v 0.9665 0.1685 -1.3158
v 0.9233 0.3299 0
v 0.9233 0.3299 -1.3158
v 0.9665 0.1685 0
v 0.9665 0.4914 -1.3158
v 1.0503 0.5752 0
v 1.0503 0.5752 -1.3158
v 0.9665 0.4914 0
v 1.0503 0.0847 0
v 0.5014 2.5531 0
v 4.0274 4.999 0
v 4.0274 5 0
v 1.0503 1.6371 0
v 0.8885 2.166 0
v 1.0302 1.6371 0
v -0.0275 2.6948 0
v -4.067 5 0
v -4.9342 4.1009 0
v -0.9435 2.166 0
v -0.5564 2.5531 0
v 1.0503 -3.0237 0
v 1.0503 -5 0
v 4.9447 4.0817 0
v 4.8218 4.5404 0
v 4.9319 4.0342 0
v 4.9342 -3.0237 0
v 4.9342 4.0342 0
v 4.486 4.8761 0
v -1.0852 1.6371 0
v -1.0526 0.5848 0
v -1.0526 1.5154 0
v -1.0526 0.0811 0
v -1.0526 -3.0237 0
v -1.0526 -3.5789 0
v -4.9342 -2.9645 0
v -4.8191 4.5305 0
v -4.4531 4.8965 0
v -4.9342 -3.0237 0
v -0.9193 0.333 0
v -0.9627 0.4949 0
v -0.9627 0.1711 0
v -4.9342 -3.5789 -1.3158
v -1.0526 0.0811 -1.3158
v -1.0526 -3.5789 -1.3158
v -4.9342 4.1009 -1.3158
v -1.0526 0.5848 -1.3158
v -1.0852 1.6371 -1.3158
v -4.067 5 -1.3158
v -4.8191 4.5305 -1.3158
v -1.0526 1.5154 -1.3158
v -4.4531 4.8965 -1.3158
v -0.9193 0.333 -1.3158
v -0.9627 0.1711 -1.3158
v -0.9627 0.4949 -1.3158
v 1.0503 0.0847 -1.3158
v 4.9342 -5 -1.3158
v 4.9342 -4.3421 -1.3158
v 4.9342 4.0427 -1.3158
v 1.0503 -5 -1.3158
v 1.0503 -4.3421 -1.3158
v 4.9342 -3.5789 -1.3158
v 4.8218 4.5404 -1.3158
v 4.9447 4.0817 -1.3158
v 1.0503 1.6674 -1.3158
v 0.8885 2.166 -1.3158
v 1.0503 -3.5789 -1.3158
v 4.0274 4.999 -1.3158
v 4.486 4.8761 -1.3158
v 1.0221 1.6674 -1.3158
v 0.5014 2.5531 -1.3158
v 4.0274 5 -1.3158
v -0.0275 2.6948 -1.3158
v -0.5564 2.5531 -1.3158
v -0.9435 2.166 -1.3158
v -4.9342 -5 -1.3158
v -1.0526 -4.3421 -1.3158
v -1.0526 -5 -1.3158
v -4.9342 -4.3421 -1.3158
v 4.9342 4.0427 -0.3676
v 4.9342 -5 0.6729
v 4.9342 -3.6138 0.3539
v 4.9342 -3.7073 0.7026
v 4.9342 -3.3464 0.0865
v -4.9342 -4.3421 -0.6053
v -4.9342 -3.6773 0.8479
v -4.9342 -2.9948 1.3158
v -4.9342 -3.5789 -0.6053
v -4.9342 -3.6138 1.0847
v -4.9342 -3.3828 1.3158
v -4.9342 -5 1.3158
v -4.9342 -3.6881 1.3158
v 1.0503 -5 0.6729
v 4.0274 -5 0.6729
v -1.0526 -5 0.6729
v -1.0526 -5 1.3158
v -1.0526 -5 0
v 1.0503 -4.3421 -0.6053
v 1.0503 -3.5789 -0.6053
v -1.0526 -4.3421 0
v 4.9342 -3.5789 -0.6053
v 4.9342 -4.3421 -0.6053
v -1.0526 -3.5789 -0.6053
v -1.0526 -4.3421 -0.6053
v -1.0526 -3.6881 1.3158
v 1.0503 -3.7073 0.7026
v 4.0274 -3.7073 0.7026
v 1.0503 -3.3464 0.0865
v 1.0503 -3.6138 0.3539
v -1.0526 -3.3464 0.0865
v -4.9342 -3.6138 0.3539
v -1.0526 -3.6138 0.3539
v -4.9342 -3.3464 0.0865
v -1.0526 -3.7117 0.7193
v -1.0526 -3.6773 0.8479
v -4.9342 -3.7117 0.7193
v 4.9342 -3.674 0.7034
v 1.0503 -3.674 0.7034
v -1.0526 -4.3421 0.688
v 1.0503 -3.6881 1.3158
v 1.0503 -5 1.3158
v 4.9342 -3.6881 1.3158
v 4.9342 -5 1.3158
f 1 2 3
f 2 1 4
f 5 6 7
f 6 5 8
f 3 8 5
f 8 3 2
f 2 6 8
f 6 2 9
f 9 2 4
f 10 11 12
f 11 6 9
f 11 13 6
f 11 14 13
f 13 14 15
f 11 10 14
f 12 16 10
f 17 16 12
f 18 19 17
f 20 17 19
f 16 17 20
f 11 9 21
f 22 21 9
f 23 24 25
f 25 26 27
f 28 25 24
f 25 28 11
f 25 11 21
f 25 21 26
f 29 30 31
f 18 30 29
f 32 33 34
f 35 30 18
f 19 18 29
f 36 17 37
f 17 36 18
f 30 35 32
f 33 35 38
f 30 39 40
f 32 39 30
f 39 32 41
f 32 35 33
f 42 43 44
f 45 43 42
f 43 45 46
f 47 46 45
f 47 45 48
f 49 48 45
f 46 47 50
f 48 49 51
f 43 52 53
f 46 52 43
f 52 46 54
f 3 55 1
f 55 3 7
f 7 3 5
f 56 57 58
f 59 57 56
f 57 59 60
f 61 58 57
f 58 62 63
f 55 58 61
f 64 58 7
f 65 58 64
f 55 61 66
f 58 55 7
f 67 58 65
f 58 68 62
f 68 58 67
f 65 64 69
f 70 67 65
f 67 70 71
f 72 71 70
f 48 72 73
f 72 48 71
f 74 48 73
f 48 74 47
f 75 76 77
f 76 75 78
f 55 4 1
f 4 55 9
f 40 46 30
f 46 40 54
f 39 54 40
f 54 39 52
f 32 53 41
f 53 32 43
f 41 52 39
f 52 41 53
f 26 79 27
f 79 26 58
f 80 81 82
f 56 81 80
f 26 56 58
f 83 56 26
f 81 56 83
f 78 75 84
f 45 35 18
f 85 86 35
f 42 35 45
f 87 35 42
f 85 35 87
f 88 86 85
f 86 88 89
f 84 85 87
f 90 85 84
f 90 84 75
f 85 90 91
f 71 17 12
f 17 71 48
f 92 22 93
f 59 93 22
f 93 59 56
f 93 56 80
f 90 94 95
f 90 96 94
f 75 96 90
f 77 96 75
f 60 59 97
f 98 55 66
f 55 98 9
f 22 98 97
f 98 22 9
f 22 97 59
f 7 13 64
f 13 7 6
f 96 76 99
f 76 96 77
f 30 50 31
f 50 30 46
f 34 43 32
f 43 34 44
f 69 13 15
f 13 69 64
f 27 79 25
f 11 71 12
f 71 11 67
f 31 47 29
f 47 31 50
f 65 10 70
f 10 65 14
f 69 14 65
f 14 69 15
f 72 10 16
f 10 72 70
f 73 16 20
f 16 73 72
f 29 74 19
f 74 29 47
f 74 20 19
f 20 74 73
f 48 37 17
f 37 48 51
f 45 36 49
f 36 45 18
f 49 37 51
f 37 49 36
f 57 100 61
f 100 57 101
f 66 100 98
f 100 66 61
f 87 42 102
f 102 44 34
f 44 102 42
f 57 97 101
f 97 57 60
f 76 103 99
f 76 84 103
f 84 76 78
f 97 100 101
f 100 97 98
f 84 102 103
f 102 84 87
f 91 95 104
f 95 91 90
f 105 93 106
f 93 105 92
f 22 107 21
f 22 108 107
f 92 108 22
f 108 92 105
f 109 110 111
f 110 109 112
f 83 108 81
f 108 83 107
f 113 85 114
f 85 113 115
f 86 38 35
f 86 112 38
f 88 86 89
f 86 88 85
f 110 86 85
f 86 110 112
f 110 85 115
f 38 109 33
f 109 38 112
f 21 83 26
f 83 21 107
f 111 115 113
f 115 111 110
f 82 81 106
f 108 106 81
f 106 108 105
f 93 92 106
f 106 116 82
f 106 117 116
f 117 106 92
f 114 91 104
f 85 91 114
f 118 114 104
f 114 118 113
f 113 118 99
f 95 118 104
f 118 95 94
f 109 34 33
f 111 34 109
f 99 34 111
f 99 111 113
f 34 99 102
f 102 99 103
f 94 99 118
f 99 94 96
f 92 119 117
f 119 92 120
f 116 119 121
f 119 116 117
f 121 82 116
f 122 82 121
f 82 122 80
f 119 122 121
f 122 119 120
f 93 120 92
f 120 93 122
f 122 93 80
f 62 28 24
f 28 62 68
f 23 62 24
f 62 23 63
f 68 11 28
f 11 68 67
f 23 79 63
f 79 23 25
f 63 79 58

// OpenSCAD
intersection() {
translate([-5.921052, -6.000000, -1.578948])
cube(size = [11.842104, 12.000000, 3.157896], center = false);
union() {
// Begin.
union() {
difference() {
difference() {
union() {
union() {
rotate([0, -90, 0])
translate([-0.657895, 0.32995, -1.24614])
rotate([0, 90, 0])
cylinder(h = 1.31579, r1 = 0.32288, r2 = 0.32288, center = true, $fn = 12);

rotate([0, -90, 0])
translate([-9.1, 0.33299, 1.24306])
rotate([0, 90, 0])
cylinder(h = 18.2, r1 = 0.32378, r2 = 0.32378, center = true, $fn = 12);
}

difference() {
rotate([0, -0, 0])
translate([0, 0, -0.657895])
cube(size = [9.86842, 10, 1.31579], center = true);

rotate([-178.681, -0, 0])
translate([-0.00116301, 8.28164, 0])
cube(size = [2.10293, 19.8367, 36.4], center = true);
}
}

difference() {
union() {
rotate([-178.681, -0, 0])
translate([-1.45142, -0.534728, 0])
cube(size = [5.00345, 6.99678, 36.4], center = true);

rotate([-178.681, -0, 0])
translate([0.49053, -11.1166, 0])
cube(size = [8.88736, 14.1669, 36.4], center = true);
}

difference() {
rotate([0, -0, 0])
translate([0.03711, 7.31053, -0.657895])
cube(size = [7.98052, 21.7789, 1.31579], center = true);

rotate([0, -90, 0])
translate([-0.657895, 1.63709, 0.0275])
rotate([0, 90, 0])
cylinder(h = 1.31579, r1 = 1.05773, r2 = 1.05773, center = true, $fn = 12);
}
}
}

difference() {
union() {
rotate([0, -0, 0])
translate([-6.6329, -3.96053, 0])
cube(size = [23.1342, 0.76316, 2.63158], center = true);

difference() {
rotate([-178.681, -0, 0])
translate([-11.0766, -11.1166, 8.70612])
cube(size = [14.2469, 14.1669, 18.9878], center = true);

rotate([0, -90, 0])
translate([0, 4.03059, 3.95315])
rotate([0, 90, 0])
cylinder(h = 36.4, r1 = 0.99991, r2 = 0.99991, center = true, $fn = 12);
}
}

rotate([0, -0, 0])
translate([8.57369, 0, 0.355265])
cube(size = [19.2526, 36.4, 1.92105], center = true);
}
}

union() {
intersection() {
difference() {
difference() {
rotate([0, -0, 0])
translate([0, 6.6, 0.355265])
cube(size = [9.86842, 23.2, 1.92105], center = true);

rotate([-178.681, -0, 0])
translate([-6.6329, -7.61817, 0])
cube(size = [23.1342, 21.1637, 36.4], center = true);
}

union() {
rotate([-178.681, -0, 0])
translate([-1.45142, 10.5818, 8.70612])
cube(size = [5.00345, 15.2363, 18.9878], center = true);

rotate([0, -0, 0])
translate([6.6329, -2.98097, 0.71933])
rotate([0, 90, 0])
cylinder(h = 23.1342, r1 = 0.73077, r2 = 0.73077, center = true, $fn = 12);
}
}

union() {
union() {
rotate([0, -0, 0])
translate([-11.5671, -2.98097, 0.71933])
rotate([0, 90, 0])
cylinder(h = 13.2658, r1 = 0.73077, r2 = 0.73077, center = true, $fn = 12);

rotate([-178.681, -0, 0])
translate([11.1137, 10.9284, 8.70612])
cube(size = [14.1726, 14.5432, 18.9878], center = true);
}

union() {
rotate([-178.681, -0, 0])
translate([-2.99342, 10.9284, 0])
cube(size = [3.88158, 14.5432, 36.4], center = true);

rotate([-178.681, -0, 0])
translate([0, 10.5818, 8.70612])
cube(size = [9.86842, 15.2363, 18.9878], center = true);
}
}
}

union() {
difference() {
intersection() {
rotate([0, -0, 0])
translate([0.03711, 6.6, 0.355265])
cube(size = [7.98052, 23.2, 1.92105], center = true);

rotate([-178.681, -0, 0])
translate([-2.50289, 10.5818, 8.70612])
cube(size = [2.90052, 15.2363, 18.9878], center = true);
}

union() {
rotate([0, -0, 0])
translate([1.48737, -11.2711, 9.1])
cube(size = [5.08, 13.8579, 18.2], center = true);

rotate([0, -0, 0])
translate([0.03711, -2.98097, 0.71933])
rotate([0, 90, 0])
cylinder(h = 7.98052, r1 = 0.73077, r2 = 0.73077, center = true, $fn = 12);
}
}

union() {
intersection() {
rotate([-178.681, -0, 0])
translate([9.62515, 10.9284, -9.49388])
cube(size = [17.1497, 14.5432, 17.4122], center = true);

rotate([0, -0, 0])
translate([-6.6329, -4.28947, 0.657895])
cube(size = [23.1342, 1.42105, 1.31579], center = true);
}

rotate([0, -90, 0])
translate([-0.657895, 4.08172, -4.02737])
rotate([0, 90, 0])
cylinder(h = 1.31579, r1 = 0.9173, r2 = 0.9173, center = true, $fn = 12);
}
}
}
}
// End.
}
}
